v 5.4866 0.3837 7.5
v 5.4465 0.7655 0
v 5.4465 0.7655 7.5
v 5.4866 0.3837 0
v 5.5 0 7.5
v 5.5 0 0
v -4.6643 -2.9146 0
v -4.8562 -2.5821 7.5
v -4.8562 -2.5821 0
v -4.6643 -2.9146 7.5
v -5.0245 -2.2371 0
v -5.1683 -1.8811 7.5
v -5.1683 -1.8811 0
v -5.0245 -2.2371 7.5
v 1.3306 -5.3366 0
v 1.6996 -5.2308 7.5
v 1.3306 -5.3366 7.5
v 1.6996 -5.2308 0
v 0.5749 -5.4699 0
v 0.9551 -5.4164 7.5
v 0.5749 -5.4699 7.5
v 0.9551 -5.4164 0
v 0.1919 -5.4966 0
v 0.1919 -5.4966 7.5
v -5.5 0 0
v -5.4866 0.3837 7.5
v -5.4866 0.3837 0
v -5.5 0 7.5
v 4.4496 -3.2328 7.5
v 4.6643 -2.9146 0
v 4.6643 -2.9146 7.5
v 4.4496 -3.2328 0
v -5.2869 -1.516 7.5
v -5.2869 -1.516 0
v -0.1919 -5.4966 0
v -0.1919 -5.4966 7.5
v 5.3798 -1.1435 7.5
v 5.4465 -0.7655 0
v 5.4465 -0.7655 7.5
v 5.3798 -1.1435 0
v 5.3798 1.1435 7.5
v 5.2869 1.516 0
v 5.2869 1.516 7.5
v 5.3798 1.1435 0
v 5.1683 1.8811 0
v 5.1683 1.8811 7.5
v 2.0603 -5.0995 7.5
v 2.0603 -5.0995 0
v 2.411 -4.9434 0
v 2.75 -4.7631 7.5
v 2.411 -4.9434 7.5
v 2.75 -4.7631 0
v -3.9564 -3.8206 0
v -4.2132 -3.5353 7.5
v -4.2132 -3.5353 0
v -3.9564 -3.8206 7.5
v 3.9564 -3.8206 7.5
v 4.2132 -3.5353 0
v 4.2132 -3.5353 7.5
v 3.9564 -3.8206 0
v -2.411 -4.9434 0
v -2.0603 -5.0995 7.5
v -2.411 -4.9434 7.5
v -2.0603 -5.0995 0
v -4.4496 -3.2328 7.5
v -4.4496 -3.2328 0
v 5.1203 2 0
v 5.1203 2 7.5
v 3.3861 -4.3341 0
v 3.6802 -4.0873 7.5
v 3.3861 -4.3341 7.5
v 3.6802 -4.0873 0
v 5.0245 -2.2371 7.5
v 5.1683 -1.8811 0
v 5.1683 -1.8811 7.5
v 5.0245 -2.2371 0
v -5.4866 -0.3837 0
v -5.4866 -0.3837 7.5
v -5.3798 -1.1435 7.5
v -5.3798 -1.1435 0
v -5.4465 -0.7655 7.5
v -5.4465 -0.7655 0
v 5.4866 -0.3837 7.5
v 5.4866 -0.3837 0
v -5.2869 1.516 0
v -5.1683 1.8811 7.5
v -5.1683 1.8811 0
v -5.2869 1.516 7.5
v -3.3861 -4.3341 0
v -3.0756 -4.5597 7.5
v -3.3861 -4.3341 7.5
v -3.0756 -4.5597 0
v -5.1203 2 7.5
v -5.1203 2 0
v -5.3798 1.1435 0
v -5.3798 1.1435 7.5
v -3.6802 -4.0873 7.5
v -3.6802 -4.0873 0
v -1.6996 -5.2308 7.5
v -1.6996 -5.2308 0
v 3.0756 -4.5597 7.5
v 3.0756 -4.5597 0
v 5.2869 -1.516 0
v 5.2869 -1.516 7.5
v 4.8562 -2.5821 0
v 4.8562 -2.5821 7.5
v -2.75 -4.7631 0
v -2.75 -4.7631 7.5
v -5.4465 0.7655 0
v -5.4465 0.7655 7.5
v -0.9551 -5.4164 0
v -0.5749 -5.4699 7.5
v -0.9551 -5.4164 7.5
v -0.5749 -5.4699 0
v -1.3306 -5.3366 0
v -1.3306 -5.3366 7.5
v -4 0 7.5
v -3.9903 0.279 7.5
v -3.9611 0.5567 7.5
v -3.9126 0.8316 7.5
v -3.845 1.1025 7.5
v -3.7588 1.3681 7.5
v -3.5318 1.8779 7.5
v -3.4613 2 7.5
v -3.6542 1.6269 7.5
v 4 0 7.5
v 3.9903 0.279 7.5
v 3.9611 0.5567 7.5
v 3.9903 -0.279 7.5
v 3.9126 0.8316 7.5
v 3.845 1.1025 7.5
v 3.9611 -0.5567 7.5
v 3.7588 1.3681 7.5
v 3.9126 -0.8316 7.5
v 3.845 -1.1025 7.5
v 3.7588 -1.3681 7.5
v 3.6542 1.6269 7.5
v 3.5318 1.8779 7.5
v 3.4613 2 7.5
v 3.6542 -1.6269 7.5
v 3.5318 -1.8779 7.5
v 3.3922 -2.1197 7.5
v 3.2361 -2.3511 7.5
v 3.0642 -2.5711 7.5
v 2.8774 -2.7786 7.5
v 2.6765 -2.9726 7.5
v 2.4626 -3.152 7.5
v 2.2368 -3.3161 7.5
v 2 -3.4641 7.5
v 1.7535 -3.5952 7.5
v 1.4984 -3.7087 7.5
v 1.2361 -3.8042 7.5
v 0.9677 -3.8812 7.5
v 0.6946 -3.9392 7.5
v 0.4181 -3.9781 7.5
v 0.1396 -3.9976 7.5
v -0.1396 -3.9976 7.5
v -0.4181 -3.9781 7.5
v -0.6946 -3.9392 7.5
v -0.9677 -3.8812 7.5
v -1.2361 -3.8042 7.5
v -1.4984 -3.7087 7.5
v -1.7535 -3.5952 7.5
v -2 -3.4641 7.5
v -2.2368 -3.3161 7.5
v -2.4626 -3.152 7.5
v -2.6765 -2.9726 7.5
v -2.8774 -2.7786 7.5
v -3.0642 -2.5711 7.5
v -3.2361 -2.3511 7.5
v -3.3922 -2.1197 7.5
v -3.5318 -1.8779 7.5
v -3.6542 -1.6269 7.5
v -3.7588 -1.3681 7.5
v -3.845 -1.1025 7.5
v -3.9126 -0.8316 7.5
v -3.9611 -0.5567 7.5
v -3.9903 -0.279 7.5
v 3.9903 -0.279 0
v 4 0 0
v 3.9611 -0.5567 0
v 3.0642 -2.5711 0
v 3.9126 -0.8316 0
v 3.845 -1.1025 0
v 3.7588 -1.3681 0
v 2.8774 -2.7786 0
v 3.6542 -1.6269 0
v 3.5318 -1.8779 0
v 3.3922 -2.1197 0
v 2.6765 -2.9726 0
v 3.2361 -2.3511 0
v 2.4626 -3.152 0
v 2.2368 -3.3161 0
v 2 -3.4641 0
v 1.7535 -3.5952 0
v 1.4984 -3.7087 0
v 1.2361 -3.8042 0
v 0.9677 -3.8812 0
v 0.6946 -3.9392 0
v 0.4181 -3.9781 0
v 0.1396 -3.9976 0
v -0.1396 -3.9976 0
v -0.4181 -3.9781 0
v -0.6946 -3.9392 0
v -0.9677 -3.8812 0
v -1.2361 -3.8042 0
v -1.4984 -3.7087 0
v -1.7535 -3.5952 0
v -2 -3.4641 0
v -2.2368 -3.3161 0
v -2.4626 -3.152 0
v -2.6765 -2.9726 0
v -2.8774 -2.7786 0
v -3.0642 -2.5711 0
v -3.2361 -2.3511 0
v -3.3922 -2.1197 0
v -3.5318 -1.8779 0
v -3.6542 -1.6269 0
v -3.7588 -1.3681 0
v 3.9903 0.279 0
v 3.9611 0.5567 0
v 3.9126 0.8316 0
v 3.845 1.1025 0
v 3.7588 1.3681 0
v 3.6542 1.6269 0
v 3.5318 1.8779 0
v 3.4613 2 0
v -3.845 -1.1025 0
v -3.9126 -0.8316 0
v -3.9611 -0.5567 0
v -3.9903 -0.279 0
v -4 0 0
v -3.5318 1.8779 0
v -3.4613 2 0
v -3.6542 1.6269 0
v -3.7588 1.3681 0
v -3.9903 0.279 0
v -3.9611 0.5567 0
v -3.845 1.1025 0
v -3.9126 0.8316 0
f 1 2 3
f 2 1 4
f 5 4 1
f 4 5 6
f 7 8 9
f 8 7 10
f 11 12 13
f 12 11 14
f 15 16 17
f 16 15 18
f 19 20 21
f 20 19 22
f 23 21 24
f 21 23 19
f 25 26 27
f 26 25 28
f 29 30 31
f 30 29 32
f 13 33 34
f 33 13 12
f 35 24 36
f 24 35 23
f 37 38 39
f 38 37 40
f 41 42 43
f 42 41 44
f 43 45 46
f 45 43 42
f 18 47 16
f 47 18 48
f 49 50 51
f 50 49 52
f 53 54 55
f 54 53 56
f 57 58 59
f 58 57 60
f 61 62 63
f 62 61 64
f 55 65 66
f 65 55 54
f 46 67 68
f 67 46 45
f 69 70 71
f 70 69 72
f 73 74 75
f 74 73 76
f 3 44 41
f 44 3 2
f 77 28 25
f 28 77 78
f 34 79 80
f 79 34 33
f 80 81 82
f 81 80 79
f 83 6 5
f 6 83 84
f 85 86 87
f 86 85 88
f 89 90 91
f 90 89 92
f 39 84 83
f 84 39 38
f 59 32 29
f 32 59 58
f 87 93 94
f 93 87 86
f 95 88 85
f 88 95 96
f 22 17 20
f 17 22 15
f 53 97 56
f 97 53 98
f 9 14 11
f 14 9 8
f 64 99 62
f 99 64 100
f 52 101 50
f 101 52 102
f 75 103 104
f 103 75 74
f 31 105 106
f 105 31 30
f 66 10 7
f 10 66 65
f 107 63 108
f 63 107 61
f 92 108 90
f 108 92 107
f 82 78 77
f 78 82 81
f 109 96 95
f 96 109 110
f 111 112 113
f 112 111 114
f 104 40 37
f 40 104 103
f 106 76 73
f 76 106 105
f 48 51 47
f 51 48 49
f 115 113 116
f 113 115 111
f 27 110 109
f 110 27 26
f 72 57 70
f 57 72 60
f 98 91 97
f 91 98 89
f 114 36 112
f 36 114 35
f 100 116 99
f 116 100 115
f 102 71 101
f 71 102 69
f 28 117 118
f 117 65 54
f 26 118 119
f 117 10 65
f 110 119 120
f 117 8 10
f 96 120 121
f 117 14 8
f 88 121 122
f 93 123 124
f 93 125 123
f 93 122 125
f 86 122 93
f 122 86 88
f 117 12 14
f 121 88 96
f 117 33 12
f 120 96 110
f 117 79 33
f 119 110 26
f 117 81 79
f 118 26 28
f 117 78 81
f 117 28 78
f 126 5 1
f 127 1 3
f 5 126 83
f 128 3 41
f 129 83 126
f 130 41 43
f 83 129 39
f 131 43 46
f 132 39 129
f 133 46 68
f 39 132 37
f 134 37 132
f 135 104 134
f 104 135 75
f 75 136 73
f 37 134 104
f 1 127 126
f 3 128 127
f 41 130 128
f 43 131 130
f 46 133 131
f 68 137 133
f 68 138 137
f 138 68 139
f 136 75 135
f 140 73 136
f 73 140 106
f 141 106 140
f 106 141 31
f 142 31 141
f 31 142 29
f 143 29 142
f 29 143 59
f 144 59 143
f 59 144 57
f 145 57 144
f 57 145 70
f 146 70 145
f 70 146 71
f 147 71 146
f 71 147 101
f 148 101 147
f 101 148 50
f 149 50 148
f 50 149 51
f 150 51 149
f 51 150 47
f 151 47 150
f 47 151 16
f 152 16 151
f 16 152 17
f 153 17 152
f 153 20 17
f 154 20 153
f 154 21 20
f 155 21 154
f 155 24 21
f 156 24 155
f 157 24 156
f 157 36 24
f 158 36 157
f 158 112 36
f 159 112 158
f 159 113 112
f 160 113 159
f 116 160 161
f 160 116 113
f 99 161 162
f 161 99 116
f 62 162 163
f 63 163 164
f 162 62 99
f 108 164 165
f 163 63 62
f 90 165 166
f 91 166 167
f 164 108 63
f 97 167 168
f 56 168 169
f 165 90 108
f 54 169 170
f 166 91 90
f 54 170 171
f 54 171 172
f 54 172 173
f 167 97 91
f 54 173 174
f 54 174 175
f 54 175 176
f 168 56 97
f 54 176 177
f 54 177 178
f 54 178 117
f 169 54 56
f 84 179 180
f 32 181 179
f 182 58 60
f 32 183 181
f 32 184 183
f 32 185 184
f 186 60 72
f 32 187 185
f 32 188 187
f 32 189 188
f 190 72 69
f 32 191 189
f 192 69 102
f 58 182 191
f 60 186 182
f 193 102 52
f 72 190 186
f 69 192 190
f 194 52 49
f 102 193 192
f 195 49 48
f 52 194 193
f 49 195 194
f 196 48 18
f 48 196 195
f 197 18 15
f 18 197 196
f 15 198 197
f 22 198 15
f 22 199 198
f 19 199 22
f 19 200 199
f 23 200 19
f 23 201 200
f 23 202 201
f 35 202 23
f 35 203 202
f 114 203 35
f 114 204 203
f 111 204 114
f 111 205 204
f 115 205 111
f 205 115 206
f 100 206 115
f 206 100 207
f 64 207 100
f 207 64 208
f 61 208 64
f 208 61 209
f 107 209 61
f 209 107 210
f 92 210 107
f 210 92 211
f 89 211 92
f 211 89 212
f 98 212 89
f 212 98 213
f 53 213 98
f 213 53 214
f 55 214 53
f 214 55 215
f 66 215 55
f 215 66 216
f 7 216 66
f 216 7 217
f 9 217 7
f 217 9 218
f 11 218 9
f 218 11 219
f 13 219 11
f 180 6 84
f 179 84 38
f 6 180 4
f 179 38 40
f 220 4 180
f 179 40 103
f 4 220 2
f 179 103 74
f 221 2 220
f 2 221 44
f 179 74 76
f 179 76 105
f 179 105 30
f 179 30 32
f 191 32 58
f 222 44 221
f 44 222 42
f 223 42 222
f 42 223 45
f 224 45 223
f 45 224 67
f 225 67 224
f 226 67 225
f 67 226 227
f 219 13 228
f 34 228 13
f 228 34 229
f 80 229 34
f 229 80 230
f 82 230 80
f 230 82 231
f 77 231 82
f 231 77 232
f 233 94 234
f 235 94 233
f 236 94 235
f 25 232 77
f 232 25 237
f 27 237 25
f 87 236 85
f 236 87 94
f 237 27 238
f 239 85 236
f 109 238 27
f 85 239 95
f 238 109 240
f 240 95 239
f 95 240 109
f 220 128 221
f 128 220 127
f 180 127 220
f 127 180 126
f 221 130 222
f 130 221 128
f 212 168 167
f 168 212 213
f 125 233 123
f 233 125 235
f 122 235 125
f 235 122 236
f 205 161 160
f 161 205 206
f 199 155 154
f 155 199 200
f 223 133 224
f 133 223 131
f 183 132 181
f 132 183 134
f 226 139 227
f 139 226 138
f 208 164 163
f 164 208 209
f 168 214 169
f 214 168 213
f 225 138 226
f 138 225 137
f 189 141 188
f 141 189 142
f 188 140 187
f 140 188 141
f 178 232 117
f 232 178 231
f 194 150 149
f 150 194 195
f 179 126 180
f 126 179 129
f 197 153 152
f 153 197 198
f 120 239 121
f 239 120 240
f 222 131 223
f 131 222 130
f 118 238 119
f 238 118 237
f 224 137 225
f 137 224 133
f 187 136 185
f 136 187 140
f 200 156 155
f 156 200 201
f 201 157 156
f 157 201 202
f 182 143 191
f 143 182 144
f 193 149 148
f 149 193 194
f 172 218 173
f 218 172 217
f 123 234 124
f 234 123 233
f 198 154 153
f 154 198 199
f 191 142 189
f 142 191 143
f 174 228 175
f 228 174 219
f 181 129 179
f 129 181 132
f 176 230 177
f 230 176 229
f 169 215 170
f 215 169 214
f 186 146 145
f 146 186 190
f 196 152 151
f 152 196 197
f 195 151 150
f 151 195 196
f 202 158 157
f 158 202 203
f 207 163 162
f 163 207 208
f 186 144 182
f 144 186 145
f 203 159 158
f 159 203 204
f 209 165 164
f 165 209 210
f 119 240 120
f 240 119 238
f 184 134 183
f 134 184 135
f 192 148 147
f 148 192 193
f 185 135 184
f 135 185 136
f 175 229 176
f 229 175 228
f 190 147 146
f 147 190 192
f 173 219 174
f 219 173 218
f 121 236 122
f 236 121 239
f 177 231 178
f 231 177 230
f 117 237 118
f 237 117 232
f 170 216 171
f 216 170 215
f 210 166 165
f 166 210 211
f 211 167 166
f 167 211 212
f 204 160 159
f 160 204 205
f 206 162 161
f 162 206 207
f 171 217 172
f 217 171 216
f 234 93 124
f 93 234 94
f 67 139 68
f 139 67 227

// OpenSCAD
$fa=4; // default minimum facet angle is now 0.5
$fs=0.05; // default minimum facet size is now 0.05 mm

difference() {
  cylinder(r = 5.5, h = 7.5);
  cylinder(r = 4, h = 7.5);
  translate([-10, 2, 0]) cube([20, 10, 10]);
  }
